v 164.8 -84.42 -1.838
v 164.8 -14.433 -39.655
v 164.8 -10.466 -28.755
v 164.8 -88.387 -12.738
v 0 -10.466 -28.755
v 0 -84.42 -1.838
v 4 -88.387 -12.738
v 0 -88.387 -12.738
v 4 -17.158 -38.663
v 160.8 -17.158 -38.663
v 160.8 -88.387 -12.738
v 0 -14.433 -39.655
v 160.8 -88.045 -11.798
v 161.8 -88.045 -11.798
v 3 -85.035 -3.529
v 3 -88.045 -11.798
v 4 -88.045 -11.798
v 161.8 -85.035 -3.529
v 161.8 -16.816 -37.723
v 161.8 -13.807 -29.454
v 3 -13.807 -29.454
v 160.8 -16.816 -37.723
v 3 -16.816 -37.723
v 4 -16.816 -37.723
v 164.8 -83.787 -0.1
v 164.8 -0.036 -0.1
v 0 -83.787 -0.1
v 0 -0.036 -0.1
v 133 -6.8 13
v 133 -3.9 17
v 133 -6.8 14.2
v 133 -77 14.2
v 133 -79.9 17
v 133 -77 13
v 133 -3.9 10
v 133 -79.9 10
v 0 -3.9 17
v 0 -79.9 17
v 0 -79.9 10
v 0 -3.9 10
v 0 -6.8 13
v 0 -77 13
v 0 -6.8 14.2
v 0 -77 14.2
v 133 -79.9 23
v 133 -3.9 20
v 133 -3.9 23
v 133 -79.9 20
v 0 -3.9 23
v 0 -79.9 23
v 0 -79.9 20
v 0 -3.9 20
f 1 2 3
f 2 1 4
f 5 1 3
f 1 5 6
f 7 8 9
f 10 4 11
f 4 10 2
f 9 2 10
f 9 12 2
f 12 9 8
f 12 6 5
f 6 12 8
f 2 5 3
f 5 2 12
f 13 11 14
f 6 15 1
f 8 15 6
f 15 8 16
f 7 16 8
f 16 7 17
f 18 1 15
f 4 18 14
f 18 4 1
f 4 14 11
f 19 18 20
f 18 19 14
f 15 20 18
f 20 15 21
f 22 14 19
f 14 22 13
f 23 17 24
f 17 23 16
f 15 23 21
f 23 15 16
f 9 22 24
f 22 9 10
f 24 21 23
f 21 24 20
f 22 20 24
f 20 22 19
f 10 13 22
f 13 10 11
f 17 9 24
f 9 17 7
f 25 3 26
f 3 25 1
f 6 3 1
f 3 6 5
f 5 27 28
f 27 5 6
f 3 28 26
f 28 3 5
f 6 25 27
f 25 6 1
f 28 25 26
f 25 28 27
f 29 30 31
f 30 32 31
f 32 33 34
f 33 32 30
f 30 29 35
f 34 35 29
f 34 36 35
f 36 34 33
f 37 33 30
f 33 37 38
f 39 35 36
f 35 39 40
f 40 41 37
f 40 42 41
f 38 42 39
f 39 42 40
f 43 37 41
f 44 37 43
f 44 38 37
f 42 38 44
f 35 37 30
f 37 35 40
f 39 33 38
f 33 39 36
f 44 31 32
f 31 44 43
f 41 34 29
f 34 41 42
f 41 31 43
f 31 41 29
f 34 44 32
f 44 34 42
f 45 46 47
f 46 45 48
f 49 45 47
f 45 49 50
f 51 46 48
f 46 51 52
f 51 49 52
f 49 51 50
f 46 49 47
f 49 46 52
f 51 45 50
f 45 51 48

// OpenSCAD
phone = [158.8,75.7,7.6];
holder = [133,70,1];
angle = 20;
wall = 3;
block = 20;

difference() {
    rotate([-angle,0,0])
    translate([0,-phone[1]-wall,-(wall+phone[2]+block)]) union() {
        cube(phone+[2*wall,wall,wall+block]);
        translate([0,0,-wall-phone[2]-1]) difference() {
            cube(phone+[2*wall,wall,wall+1]);
            translate([wall,-0.1,1]) cube(phone+[0,0.2,1.2]);
            translate([wall+1,-0.1,-0.1]) cube(phone+[-2,0.2,1.2]);
        }
    }
    translate([-0.1,-200,-0.1]) cube([200,200.1,200]);
}

translate([0,-holder[1]-3.3*wall,10]) difference() {
    cube(holder+[0,2*wall,2*wall]);
    translate([-0.1,wall-0.1,wall]) cube(holder+[0.1,0.2,0.2]);
}

translate([0,-holder[1]-3.3*wall,20]) difference() {
    cube(holder+[0,2*wall,2]);
}
